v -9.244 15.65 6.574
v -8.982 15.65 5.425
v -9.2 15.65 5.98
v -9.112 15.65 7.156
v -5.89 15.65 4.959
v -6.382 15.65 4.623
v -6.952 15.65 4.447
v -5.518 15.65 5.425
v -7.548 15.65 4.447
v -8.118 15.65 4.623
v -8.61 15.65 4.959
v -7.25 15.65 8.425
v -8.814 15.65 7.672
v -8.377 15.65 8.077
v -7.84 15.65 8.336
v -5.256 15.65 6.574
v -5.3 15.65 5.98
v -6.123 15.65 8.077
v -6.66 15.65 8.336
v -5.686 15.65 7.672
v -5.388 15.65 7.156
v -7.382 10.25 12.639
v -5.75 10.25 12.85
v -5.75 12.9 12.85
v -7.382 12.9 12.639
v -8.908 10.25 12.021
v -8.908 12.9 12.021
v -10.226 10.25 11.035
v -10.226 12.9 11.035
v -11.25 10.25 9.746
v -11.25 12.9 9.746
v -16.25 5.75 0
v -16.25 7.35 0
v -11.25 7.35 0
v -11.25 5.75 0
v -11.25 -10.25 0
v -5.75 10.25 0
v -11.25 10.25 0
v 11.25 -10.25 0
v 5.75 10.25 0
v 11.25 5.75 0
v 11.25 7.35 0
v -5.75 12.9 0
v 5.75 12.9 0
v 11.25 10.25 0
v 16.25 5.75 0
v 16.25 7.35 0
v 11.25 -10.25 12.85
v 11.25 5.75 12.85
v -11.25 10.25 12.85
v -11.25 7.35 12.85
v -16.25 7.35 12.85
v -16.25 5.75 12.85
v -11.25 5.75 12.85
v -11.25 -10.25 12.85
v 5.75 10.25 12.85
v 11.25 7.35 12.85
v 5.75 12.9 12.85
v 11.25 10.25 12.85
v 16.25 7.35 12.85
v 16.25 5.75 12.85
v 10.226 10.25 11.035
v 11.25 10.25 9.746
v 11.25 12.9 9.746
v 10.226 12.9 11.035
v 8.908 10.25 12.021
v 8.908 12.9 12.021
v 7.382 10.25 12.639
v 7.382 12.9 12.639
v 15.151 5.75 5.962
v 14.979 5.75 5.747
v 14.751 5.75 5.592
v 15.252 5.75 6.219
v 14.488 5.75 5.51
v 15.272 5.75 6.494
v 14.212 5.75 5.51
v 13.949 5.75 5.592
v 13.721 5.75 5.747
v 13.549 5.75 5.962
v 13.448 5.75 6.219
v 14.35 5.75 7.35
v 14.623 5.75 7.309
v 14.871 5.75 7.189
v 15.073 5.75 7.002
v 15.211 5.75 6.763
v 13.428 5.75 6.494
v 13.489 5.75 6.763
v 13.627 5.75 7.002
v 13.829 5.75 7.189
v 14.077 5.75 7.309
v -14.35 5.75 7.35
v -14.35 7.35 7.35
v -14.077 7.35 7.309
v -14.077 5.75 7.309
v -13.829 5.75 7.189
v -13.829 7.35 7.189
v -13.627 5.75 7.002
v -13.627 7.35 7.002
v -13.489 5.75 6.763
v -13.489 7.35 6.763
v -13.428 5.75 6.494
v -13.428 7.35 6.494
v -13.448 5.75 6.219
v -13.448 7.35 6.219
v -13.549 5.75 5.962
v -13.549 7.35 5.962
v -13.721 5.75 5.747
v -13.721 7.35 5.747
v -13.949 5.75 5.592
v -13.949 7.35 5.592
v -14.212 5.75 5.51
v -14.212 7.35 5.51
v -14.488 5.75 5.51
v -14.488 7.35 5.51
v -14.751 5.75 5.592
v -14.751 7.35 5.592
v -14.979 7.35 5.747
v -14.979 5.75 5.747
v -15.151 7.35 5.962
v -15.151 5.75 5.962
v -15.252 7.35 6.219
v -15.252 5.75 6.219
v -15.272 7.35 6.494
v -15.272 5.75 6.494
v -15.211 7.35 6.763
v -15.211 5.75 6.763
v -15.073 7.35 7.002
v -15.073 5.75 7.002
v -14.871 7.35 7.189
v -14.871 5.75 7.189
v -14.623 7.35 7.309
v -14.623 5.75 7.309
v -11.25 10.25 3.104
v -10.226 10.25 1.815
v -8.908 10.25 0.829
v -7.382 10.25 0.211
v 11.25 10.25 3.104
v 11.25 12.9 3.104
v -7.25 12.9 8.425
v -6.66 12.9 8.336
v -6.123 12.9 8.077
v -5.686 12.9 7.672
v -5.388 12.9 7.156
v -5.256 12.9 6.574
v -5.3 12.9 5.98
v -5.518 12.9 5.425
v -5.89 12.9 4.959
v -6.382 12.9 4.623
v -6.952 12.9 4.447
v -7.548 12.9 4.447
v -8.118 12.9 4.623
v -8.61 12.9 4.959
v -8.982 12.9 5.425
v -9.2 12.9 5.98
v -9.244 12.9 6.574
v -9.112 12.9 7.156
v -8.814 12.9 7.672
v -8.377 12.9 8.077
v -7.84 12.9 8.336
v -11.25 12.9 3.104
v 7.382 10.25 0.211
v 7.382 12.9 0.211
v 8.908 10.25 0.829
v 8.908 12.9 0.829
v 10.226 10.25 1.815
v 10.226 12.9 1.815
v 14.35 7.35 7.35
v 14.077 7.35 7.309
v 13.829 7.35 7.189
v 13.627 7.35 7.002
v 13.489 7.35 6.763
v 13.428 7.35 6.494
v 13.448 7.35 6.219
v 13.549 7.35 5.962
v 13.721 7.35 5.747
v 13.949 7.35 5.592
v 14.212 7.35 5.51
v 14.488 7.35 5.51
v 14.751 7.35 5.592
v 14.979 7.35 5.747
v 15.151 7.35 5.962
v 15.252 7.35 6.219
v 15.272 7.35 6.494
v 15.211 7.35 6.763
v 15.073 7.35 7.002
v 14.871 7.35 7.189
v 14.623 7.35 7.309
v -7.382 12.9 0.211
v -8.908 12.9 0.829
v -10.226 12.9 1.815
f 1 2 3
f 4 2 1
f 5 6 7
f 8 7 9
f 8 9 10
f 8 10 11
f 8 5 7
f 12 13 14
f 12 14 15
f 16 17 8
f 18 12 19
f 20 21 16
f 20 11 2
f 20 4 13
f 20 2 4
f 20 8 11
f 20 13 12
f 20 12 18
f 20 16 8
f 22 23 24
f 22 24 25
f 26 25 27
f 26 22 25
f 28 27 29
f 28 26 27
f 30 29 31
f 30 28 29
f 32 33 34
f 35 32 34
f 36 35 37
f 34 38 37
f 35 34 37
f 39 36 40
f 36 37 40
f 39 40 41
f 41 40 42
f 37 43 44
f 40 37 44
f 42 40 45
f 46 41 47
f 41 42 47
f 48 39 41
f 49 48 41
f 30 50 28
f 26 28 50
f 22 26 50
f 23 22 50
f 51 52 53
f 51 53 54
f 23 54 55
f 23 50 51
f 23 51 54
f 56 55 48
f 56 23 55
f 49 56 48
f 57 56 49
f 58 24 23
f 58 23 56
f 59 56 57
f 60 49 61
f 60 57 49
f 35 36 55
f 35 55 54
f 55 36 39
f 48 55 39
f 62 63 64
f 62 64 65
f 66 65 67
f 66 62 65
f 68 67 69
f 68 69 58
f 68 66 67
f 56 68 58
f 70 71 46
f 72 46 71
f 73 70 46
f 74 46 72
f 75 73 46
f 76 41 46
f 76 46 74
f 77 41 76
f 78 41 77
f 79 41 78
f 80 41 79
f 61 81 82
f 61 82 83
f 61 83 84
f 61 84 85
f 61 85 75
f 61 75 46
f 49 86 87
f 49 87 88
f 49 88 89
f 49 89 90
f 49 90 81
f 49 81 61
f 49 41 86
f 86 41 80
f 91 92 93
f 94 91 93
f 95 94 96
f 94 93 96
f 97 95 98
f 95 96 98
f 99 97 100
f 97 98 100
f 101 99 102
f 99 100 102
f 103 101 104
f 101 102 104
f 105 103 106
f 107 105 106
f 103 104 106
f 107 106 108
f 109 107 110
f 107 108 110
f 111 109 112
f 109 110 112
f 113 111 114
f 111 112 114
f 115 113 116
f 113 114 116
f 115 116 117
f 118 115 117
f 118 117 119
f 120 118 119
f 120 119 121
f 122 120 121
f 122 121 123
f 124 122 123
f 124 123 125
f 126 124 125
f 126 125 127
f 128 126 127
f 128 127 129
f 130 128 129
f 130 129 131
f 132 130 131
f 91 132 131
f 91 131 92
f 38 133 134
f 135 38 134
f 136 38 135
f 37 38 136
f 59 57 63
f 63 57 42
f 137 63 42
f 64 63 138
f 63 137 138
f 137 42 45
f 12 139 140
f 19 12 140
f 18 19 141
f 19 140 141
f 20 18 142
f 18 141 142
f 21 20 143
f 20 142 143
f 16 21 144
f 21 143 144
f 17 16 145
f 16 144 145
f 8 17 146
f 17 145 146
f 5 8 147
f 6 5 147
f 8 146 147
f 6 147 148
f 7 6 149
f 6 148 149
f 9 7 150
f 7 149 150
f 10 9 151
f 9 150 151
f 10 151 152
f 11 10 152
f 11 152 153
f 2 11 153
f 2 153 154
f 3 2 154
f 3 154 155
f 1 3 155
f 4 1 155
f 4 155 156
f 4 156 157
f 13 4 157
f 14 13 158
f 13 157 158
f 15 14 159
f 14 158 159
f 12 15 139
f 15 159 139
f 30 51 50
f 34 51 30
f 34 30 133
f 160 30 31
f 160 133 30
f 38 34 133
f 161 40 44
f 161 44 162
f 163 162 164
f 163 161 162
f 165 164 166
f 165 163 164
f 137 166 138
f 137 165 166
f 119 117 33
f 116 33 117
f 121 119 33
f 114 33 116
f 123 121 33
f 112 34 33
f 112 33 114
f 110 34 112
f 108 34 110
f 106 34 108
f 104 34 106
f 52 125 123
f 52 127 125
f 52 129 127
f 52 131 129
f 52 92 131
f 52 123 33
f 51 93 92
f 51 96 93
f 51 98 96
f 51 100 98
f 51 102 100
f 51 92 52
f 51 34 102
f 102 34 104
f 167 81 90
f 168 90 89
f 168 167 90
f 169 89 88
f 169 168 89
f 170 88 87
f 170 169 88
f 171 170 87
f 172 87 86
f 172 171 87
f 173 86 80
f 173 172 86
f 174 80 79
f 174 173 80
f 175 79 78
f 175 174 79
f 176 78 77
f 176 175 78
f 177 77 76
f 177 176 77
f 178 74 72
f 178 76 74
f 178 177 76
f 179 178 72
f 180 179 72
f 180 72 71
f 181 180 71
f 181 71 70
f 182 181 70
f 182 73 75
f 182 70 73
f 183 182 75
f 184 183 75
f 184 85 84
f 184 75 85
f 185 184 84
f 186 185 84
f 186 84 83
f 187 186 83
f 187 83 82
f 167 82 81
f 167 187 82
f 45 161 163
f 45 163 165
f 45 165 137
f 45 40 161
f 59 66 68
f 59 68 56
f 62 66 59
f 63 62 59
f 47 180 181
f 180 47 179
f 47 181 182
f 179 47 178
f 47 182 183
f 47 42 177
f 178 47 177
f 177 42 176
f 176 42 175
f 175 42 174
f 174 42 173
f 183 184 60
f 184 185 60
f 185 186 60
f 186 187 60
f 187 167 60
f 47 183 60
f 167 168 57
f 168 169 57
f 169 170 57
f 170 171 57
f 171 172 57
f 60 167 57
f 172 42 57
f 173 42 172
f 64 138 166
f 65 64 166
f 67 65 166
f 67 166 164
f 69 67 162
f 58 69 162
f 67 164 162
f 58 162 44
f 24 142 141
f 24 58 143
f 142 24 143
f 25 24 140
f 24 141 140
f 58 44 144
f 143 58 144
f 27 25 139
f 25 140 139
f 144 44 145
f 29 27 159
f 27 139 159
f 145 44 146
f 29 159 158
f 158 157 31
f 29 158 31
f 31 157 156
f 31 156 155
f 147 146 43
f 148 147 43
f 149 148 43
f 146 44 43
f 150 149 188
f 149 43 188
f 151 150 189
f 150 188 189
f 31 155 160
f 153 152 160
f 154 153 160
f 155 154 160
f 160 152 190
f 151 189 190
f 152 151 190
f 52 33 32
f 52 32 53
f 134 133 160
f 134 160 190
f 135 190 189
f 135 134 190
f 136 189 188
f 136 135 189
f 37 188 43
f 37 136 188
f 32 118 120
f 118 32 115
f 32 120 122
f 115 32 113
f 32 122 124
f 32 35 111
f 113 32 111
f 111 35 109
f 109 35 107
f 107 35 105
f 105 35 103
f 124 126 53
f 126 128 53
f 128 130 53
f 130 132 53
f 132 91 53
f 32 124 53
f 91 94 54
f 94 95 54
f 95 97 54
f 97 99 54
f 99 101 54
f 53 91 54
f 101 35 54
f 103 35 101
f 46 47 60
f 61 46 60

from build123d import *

# Parameters (mm, degrees)
ESQUISSE1_W      = 22.5
ESQUISSE1_H      = 20.5
EXTRUSION1_DEPTH = 12.85
EXTRUSION2_DEPTH = 2.65
ESQUISSE3_W      = 12.85
ESQUISSE3_H      = 1.6
EXTRUSION3_DEPTH = 5
ESQUISSE5_R      = 0.925
EXTRUSION5_DEPTH = 2.75
ESQUISSE4_R      = 2
EXTRUSION4_DEPTH = 2.75


with BuildPart() as part:
    # Esquisse1 → Extrusion1 (new body)
    with BuildSketch(Plane.XY):
        Rectangle(ESQUISSE1_W, ESQUISSE1_H)
    extrude(amount=EXTRUSION1_DEPTH)

    # Esquisse2 → Extrusion2 (add)
    with BuildSketch(Plane(origin=(0, 10.25, 0), x_dir=(1, 0, 0), z_dir=(0, 1, 0))):
        with BuildLine():
            Line((-5.75, 0), (5.75, 0))
            ThreePointArc((5.75, 0), (8.907662728, -0.829484734), (11.25, -3.103761526))
            Line((11.25, -3.103761526), (11.25, -9.746238474))
            ThreePointArc((11.25, -9.746238474), (8.907662728, -12.020515266), (5.75, -12.85))
            Line((5.75, -12.85), (-5.75, -12.85))
            ThreePointArc((-5.75, -12.85), (-8.907662728, -12.020515266), (-11.25, -9.746238474))
            Line((-11.25, -9.746238474), (-11.25, -3.103761526))
            ThreePointArc((-11.25, -3.103761526), (-8.907662728, -0.829484734), (-5.75, 0))
        make_face()
    extrude(amount=EXTRUSION2_DEPTH)

    # Esquisse3 → Extrusion3 (add)
    with BuildSketch(Plane.ZY.offset(11.25)):
        with Locations((6.425, 6.55)):
            Rectangle(ESQUISSE3_W, ESQUISSE3_H)
    extrusion3 = extrude(amount=EXTRUSION3_DEPTH)

    # Esquisse5 → Extrusion5 (cut)
    with BuildSketch(Plane(origin=(0, 7.35, 0), x_dir=(1, 0, 0), z_dir=(0, 1, 0))):
        with Locations(Location((-14.35, -6.425, 0), (0, 0, 270))):
            Circle(ESQUISSE5_R)
    extrusion5 = extrude(amount=-EXTRUSION5_DEPTH, mode=Mode.SUBTRACT)

    # Symétrie1: Extrusion3, Extrusion5 across plane
    add(extrusion3.mirror(Plane(origin=(0, 0, 0), x_dir=(0, 0, 1), z_dir=(1, 0, 0))))
    add(extrusion5.mirror(Plane(origin=(0, 0, 0), x_dir=(0, 0, 1), z_dir=(1, 0, 0))), mode=Mode.SUBTRACT)

    # Esquisse4 → Extrusion4 (add)
    with BuildSketch(Plane(origin=(0, 12.9, 0), x_dir=(1, 0, 0), z_dir=(0, 1, 0))):
        with Locations(Location((-7.25, -6.425, 0), (0, 0, 270))):
            Circle(ESQUISSE4_R)
    extrude(amount=EXTRUSION4_DEPTH)


solid = part.part
